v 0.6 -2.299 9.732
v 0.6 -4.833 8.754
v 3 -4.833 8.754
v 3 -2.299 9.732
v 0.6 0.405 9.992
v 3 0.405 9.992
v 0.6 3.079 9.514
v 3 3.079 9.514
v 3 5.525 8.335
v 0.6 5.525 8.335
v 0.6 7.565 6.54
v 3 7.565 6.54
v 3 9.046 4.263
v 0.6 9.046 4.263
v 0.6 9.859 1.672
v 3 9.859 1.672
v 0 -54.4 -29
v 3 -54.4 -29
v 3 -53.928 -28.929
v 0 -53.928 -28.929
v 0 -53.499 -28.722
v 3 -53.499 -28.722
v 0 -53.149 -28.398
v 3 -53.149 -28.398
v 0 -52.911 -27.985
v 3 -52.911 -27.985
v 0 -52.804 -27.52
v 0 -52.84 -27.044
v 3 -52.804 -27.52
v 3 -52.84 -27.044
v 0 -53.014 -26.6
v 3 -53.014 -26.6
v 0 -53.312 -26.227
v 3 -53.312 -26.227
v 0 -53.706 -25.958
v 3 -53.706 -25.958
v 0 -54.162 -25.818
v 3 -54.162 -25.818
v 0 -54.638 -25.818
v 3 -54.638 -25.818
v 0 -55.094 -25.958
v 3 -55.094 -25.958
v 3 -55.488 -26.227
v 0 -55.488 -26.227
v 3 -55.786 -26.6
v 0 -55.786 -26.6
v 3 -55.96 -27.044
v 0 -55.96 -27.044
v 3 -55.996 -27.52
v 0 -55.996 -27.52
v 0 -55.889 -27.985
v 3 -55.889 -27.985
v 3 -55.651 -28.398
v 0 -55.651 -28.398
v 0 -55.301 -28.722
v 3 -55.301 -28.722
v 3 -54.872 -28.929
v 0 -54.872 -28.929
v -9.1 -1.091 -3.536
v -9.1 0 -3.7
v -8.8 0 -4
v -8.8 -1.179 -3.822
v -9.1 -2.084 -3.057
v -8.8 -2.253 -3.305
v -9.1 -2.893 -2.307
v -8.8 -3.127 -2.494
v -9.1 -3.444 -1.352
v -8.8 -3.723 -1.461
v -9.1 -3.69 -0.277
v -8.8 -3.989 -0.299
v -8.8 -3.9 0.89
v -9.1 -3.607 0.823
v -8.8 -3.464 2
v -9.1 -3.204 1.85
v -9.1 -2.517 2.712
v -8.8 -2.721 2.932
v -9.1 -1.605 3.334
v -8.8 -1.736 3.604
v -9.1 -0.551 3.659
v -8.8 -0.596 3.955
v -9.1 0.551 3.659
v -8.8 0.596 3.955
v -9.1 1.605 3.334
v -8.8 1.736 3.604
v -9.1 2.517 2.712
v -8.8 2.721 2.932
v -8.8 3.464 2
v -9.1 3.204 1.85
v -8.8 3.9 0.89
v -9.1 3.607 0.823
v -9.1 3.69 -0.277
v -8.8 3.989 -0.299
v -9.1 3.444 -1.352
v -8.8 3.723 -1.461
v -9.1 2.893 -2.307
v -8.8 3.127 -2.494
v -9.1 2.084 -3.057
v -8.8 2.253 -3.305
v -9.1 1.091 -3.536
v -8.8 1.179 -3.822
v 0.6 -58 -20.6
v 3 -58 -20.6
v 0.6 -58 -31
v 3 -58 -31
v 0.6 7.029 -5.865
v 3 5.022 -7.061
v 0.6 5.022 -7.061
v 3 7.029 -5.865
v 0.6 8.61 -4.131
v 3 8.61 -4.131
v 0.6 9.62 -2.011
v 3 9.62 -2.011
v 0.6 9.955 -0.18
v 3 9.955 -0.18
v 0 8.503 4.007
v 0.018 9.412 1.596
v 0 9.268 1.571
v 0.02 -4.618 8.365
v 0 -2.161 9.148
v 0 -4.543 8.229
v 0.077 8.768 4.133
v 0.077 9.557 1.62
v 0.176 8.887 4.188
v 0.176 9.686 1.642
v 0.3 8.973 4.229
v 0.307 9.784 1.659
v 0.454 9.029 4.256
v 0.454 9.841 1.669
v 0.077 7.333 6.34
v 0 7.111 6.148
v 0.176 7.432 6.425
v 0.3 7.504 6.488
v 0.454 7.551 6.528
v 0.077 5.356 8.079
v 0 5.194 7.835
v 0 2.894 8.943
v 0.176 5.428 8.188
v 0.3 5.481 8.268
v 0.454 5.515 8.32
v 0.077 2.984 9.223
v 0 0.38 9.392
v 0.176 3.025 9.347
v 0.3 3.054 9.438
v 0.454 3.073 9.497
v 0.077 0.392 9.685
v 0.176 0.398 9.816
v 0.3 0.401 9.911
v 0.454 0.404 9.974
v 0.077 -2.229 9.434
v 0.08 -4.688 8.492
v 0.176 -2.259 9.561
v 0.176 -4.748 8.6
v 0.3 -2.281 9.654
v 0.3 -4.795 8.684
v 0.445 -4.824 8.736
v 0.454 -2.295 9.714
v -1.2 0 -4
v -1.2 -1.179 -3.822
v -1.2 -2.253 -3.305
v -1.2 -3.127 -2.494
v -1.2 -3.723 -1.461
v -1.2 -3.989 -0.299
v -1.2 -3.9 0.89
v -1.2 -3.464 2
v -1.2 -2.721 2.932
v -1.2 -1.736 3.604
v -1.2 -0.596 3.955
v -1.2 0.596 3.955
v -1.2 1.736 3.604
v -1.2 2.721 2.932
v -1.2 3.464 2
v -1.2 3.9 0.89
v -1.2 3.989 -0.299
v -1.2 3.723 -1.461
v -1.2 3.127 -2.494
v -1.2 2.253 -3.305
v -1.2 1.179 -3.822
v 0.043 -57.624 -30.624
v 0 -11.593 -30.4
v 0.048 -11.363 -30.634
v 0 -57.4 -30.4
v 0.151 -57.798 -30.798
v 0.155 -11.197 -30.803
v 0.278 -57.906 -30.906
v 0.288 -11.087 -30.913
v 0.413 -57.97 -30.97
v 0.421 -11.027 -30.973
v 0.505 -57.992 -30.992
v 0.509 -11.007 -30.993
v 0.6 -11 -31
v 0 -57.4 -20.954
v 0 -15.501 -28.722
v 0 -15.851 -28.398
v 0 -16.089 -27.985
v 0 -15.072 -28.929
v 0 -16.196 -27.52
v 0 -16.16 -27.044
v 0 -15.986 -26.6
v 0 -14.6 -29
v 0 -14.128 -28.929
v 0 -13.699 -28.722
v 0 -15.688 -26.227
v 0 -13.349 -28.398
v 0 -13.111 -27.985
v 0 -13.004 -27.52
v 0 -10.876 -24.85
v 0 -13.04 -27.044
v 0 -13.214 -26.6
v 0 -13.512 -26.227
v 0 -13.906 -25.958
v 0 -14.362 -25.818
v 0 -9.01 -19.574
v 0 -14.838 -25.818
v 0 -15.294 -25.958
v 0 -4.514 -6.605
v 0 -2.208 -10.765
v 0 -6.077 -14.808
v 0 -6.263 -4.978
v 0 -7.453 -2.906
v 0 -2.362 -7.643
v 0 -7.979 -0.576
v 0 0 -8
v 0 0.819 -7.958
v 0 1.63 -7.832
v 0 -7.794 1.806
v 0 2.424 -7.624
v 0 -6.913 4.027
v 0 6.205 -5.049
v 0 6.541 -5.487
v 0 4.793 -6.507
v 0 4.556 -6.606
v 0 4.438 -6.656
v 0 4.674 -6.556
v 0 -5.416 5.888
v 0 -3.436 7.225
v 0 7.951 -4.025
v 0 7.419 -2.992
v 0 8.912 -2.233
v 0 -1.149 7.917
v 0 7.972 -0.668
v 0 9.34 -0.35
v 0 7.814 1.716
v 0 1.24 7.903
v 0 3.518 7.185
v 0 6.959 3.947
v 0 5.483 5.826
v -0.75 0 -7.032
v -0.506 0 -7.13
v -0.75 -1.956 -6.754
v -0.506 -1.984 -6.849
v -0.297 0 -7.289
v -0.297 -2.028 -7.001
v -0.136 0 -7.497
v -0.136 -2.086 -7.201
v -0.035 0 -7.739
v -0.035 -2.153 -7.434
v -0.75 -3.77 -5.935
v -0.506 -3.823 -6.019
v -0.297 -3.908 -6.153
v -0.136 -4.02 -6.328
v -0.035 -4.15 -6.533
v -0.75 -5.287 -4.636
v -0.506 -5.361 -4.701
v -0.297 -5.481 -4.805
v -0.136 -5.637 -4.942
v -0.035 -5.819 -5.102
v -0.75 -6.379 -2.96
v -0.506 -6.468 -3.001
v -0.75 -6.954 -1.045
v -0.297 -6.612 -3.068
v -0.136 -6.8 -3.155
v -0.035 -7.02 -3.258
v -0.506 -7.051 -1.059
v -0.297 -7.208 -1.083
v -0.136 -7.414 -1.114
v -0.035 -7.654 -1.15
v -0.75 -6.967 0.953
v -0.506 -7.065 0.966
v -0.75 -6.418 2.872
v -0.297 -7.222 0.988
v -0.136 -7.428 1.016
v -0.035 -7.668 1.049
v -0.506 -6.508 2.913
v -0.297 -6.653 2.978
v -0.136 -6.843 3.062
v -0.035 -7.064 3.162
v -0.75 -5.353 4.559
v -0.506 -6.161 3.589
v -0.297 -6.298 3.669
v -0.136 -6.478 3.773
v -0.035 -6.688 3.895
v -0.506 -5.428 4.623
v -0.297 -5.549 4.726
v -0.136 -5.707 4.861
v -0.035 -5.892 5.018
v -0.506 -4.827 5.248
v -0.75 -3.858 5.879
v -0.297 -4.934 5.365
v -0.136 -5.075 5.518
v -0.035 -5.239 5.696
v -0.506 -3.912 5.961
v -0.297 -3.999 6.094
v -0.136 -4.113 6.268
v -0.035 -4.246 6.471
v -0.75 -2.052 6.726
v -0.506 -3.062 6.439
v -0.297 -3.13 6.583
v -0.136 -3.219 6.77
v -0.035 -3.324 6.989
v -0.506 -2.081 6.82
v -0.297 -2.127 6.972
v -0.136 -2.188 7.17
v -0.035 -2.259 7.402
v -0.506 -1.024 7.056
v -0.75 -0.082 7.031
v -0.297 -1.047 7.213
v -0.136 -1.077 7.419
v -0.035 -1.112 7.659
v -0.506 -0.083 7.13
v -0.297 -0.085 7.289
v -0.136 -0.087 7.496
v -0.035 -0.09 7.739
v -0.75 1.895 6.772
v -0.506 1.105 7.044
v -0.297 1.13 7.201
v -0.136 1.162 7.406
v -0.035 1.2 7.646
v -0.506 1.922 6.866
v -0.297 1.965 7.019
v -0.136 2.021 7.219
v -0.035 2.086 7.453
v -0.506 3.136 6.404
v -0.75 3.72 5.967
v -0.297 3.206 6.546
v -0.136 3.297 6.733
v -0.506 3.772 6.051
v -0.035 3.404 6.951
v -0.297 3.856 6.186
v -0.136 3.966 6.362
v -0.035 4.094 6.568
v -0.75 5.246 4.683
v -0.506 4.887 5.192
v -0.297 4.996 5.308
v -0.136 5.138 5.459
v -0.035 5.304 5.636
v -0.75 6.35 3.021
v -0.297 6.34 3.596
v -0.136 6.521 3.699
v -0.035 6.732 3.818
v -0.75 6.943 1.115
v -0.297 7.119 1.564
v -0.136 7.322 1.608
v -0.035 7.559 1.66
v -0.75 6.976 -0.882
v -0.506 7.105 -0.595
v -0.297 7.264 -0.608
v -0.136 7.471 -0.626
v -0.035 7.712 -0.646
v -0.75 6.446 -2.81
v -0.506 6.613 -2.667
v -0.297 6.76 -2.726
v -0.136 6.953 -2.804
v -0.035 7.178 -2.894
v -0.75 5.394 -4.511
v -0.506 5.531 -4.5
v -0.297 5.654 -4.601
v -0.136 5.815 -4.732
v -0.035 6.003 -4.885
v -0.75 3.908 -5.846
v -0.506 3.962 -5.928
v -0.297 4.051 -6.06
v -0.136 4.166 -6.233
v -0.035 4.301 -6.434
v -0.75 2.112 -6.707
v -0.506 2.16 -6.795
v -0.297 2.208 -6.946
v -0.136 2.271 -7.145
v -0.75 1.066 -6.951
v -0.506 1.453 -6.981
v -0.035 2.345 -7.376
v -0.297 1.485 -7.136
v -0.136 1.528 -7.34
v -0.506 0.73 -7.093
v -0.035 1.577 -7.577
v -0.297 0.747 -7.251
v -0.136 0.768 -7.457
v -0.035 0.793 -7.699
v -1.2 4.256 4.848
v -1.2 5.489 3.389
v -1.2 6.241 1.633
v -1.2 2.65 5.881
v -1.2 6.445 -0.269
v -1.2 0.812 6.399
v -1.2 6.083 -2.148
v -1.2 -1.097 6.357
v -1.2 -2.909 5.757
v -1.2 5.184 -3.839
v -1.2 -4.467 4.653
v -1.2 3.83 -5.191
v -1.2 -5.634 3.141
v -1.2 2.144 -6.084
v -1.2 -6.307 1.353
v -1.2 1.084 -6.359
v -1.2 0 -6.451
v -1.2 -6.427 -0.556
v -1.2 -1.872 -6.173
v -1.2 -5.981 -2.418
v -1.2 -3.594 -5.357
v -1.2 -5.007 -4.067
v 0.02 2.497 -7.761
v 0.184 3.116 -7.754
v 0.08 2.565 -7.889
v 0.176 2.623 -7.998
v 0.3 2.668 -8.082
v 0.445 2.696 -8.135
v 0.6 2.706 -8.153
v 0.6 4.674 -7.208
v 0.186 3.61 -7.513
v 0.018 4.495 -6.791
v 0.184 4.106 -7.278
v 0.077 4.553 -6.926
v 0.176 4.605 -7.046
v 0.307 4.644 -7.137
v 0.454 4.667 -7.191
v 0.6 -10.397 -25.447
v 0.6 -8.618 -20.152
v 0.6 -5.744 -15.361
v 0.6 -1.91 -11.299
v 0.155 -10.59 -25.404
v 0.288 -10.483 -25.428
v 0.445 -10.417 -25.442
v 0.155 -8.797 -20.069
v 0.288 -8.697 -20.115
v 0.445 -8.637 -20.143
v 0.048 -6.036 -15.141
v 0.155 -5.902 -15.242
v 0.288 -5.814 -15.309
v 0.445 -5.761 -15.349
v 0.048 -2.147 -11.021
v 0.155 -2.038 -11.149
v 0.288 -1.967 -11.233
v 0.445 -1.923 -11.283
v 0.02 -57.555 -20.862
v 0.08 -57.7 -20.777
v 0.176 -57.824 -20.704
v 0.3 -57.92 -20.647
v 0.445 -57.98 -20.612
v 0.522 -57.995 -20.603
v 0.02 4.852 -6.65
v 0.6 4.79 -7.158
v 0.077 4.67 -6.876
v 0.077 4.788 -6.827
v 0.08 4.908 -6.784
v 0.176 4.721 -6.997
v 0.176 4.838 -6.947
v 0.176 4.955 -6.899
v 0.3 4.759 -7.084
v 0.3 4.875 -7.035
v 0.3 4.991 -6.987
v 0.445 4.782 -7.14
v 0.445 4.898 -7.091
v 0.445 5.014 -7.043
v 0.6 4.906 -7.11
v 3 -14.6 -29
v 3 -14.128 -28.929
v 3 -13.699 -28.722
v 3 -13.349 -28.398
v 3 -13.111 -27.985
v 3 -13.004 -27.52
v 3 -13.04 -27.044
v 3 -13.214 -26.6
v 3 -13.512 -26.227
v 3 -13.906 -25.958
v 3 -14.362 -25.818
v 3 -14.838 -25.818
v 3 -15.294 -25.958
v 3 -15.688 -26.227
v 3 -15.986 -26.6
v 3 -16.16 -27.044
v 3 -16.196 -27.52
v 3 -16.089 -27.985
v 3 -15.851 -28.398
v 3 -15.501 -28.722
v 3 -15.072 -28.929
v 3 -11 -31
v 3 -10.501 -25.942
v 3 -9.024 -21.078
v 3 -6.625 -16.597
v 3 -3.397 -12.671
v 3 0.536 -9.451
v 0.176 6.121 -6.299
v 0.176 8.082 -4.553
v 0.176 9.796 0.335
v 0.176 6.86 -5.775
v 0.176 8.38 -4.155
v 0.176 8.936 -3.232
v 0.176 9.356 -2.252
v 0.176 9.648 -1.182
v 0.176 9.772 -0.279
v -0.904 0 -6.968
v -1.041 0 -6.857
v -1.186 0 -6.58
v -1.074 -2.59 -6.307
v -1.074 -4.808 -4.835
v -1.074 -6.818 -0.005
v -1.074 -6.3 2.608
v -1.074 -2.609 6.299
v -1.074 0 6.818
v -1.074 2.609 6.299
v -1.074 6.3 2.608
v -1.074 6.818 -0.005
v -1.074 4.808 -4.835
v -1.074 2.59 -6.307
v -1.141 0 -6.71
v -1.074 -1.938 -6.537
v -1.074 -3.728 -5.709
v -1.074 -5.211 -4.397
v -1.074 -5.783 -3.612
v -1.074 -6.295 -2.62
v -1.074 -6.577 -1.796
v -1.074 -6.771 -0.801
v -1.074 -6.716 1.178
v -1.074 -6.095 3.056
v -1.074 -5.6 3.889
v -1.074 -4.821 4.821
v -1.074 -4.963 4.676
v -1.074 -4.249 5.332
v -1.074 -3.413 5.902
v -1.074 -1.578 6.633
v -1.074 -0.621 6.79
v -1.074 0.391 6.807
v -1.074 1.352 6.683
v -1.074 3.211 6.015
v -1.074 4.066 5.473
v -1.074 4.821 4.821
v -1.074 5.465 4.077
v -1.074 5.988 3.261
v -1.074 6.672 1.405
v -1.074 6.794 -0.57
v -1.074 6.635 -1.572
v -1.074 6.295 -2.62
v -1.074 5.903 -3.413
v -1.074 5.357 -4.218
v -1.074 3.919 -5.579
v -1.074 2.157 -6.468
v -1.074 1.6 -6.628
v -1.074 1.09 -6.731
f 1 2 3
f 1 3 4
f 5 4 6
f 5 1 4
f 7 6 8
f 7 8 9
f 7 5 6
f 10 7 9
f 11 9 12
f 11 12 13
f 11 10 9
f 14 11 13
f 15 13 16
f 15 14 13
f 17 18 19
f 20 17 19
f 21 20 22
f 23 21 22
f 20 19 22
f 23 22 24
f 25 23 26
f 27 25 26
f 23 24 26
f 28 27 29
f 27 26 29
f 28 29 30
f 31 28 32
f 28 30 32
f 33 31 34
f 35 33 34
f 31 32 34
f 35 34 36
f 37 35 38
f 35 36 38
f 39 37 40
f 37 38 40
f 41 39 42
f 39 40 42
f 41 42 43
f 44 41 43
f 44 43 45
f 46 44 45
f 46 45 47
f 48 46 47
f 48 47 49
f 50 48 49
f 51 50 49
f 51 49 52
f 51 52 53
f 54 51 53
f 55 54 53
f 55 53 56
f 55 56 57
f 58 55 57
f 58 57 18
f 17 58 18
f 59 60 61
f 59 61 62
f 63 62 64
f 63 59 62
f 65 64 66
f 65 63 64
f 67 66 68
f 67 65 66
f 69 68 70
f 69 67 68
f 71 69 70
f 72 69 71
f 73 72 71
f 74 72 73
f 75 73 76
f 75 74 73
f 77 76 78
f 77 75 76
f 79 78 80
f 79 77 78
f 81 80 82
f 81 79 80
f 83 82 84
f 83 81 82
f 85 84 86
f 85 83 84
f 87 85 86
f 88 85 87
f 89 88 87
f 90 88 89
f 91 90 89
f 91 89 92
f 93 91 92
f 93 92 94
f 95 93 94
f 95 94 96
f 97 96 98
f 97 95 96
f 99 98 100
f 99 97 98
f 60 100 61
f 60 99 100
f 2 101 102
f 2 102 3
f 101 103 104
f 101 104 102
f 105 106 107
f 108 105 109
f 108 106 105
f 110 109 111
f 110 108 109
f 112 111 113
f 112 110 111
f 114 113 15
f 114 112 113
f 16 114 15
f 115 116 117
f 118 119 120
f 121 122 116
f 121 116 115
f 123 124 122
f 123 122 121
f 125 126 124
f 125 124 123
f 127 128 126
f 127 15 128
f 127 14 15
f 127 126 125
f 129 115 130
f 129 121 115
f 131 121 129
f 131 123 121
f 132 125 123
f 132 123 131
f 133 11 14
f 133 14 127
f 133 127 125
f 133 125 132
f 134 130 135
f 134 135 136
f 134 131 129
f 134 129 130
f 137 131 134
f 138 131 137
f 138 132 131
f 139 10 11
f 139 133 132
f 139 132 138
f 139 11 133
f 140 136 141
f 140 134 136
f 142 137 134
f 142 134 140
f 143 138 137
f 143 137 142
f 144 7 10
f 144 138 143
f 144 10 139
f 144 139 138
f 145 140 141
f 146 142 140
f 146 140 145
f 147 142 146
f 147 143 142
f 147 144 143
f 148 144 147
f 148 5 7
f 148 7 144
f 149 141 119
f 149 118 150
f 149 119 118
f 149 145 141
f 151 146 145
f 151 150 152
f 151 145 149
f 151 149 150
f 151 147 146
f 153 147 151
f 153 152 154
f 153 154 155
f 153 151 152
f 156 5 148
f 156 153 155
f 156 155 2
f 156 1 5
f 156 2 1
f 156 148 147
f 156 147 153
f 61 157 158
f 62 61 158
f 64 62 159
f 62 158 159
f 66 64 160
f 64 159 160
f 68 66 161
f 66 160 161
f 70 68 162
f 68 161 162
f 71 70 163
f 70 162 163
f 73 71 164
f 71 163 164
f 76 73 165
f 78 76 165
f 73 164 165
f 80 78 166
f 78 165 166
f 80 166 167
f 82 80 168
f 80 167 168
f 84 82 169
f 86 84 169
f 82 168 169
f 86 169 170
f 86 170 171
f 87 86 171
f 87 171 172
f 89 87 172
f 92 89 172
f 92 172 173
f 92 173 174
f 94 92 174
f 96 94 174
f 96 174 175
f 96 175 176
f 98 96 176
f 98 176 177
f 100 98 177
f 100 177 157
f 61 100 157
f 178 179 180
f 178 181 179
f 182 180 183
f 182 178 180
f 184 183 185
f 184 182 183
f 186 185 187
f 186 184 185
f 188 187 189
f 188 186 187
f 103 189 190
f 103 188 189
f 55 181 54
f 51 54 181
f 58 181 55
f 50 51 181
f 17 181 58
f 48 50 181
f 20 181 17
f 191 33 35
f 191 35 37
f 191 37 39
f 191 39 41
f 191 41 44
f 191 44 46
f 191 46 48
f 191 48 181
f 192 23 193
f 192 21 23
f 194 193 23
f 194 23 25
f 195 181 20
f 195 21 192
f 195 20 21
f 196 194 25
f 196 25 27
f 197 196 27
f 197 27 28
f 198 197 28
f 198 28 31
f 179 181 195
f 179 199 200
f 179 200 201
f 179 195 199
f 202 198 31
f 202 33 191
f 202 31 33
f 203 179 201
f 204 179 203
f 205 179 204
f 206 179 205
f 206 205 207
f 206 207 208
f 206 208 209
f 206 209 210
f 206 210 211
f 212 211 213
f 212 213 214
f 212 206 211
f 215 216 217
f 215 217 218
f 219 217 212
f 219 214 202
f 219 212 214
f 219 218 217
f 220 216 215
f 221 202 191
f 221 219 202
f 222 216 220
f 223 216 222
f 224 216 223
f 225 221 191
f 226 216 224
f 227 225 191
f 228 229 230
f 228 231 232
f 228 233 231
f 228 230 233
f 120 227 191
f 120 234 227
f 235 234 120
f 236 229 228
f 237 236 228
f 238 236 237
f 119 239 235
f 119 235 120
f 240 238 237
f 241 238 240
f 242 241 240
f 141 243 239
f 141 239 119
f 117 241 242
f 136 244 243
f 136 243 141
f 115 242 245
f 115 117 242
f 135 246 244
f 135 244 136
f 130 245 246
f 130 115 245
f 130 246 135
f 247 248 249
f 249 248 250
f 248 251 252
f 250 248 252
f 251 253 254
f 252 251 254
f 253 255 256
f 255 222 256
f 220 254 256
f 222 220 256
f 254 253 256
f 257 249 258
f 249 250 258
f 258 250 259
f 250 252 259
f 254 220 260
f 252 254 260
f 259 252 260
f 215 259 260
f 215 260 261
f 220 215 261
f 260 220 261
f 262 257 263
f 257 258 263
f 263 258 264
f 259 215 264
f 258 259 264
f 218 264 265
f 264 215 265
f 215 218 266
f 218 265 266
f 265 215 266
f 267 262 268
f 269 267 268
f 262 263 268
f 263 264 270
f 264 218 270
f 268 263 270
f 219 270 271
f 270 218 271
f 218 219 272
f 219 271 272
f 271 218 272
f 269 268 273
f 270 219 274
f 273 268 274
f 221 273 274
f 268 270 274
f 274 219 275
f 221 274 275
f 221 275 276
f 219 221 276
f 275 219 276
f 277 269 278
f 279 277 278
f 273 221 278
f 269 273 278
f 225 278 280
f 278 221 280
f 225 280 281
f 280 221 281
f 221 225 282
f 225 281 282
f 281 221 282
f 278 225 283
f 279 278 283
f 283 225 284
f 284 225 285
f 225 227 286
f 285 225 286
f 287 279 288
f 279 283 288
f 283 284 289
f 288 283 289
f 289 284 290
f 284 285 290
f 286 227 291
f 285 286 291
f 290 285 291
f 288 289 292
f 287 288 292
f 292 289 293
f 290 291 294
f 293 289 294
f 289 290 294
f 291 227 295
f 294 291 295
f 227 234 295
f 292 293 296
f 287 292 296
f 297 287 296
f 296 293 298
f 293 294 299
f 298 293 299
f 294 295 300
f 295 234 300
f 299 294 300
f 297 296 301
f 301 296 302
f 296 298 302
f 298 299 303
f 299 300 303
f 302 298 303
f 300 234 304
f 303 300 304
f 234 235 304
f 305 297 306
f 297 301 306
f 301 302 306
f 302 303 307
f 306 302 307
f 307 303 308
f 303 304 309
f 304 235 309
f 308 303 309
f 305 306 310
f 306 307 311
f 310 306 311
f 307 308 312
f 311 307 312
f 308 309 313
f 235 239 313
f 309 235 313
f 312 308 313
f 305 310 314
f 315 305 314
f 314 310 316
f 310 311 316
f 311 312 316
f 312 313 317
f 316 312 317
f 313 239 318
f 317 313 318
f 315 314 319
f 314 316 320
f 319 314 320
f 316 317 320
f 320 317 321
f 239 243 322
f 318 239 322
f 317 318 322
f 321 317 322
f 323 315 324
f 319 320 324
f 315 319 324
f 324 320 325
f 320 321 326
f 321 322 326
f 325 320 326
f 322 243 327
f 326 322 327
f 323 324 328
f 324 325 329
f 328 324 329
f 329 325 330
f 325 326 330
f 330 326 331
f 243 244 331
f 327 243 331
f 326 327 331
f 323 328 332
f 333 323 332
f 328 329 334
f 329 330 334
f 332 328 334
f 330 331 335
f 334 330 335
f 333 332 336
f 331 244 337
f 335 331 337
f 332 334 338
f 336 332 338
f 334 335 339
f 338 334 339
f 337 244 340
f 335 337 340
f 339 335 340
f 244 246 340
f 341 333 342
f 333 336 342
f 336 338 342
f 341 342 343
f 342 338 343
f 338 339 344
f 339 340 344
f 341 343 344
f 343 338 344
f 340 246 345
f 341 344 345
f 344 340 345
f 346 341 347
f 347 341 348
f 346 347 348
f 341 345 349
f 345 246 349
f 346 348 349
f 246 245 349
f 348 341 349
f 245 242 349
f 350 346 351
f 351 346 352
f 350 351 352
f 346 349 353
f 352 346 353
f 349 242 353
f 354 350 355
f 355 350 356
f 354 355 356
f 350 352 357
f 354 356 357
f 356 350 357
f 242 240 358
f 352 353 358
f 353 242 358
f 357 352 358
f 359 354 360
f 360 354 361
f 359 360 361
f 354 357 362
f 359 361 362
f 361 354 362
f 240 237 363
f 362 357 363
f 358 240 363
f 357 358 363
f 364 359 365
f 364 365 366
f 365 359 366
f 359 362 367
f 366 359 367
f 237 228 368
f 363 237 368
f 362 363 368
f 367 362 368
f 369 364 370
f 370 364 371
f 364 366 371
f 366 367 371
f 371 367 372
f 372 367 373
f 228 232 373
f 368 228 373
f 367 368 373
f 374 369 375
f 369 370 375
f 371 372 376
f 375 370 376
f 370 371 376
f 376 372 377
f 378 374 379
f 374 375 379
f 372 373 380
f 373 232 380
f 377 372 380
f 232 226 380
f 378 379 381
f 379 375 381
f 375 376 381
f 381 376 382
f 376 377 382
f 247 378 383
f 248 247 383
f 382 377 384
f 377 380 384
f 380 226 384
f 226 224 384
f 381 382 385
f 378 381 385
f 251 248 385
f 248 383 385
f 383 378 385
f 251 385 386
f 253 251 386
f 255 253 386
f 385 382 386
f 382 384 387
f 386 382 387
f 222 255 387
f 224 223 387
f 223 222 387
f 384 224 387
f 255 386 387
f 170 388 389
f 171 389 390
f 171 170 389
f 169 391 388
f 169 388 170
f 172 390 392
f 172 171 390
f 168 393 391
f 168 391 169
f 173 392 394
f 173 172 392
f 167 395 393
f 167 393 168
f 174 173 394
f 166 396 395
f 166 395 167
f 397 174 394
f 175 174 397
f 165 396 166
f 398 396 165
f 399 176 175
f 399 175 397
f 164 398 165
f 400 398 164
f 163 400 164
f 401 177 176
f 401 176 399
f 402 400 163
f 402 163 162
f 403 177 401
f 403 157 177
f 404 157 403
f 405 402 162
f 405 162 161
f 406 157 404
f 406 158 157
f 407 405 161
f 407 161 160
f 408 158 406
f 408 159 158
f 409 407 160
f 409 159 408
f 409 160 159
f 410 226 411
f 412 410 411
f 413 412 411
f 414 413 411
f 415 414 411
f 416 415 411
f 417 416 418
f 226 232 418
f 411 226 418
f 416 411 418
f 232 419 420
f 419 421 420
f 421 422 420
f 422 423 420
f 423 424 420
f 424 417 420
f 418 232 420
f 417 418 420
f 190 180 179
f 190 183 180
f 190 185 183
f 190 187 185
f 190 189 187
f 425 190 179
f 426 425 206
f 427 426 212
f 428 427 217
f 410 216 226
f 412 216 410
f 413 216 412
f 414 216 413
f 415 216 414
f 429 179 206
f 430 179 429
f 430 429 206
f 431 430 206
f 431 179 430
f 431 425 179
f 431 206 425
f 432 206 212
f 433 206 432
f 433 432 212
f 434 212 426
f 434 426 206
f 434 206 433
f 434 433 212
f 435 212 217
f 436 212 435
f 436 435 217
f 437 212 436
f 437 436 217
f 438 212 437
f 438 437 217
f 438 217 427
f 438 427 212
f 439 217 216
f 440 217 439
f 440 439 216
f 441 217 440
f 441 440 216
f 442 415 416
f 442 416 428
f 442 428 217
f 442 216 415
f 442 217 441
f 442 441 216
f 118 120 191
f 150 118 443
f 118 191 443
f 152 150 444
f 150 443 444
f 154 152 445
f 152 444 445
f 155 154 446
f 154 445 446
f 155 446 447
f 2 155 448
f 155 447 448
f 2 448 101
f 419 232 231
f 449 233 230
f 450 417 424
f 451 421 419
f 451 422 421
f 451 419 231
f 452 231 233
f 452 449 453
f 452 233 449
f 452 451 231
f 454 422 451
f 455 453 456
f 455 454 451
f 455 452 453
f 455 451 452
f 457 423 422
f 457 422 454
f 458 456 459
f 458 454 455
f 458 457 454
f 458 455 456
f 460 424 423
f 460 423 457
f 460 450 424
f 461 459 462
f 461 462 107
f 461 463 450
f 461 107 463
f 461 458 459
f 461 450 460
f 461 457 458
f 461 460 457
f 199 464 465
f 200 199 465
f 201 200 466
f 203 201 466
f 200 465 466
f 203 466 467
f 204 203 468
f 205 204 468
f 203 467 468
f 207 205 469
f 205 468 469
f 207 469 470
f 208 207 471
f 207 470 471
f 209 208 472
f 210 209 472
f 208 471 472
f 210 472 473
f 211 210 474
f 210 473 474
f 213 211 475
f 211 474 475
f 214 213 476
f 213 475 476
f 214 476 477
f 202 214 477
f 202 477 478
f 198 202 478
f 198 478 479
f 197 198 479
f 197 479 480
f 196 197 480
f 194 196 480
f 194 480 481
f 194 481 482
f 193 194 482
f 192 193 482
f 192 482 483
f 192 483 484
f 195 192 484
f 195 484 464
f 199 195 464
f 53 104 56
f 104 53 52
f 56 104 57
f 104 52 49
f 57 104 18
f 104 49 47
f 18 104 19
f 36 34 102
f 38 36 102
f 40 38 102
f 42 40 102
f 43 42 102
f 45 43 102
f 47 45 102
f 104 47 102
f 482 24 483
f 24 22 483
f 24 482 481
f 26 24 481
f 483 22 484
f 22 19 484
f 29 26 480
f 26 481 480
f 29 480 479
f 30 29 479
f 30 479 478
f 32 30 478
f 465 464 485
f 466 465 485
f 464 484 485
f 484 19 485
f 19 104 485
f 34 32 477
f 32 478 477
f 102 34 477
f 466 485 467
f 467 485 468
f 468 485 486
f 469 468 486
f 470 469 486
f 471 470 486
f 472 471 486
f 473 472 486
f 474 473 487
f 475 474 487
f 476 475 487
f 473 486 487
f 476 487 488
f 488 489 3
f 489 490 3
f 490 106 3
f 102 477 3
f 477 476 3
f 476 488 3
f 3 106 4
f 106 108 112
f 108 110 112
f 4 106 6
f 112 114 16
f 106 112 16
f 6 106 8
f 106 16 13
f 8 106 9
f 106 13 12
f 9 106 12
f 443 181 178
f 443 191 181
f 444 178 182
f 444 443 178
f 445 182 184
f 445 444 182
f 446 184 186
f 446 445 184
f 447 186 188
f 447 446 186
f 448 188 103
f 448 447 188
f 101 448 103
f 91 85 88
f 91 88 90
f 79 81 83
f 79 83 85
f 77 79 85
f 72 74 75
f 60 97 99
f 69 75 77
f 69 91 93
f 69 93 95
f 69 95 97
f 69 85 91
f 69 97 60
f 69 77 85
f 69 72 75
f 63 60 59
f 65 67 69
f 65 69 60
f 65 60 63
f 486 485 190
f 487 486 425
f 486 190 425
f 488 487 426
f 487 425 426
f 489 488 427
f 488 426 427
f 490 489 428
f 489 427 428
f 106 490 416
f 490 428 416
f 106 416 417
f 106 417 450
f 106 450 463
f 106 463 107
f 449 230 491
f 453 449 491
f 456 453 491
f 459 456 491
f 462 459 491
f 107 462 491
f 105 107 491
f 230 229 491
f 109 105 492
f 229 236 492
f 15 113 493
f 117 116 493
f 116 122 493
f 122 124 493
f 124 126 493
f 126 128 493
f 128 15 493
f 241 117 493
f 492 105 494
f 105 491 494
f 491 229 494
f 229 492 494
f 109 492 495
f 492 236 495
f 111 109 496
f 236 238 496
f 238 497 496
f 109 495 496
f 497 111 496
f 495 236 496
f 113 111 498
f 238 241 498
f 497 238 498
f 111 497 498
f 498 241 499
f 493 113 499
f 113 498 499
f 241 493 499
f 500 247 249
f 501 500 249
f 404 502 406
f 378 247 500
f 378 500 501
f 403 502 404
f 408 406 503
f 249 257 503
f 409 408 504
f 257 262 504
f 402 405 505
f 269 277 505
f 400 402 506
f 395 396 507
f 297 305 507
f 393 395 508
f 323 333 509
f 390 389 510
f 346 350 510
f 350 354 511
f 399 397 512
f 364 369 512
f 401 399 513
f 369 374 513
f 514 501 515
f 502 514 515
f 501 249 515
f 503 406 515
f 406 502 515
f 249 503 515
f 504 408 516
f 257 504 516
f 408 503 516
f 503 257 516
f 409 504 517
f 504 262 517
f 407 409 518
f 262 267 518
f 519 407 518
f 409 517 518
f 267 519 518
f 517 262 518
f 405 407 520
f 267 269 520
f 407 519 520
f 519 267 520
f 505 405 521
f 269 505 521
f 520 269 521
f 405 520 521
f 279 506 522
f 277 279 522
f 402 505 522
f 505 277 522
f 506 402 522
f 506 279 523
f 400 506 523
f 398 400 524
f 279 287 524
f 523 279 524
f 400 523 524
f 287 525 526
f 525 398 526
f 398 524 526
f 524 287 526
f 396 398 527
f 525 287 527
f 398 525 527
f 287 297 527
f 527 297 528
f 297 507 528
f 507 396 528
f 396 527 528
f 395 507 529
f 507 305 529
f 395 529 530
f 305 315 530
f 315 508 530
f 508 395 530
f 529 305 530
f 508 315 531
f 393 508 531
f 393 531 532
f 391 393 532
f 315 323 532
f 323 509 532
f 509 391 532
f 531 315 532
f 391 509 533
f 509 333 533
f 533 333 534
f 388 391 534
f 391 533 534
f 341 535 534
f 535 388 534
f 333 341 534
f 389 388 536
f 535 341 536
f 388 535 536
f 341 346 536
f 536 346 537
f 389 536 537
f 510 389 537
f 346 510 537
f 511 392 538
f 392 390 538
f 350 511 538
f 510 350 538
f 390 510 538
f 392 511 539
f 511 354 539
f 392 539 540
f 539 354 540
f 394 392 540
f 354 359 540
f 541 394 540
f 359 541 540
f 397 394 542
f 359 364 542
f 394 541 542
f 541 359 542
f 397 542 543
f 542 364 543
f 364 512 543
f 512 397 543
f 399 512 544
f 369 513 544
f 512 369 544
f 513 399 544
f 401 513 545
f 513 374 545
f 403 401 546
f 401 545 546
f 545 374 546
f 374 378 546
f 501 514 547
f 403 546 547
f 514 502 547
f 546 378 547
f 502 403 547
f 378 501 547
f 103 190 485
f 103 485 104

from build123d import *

# Parameters (mm, degrees)
AUFSATZ_LINEAR_AUSTRAGEN1_DEPTH = 3
SKIZZE2_R                       = 4
AUFSATZ_LINEAR_AUSTRAGEN2_DEPTH = 9.1
FASE1_SIZE                      = 0.3
SKIZZE3_R                       = 1.6
SCHNITT_LINEAR_AUSTRAGEN1_DEPTH = 6
SKIZZE4_R                       = 7
AUFSATZ_LINEAR_AUSTRAGEN3_DEPTH = 1.2
VERRUNDUNG1_R                   = 1
SCHNITT_LINEAR_AUSTRAGEN2_DEPTH = 10
VERRUNDUNG3_R                   = 8
VERRUNDUNG4_R                   = 0.6
VERRUNDUNG5_R                   = 0.6


with BuildPart() as part:
    # Skizze1 → Aufsatz-Linear austragen1 (new body)
    with BuildSketch(Plane(origin=(0, 0, 0), x_dir=(0, 0, -1), z_dir=(1, 0, 0))):
        with BuildLine():
            Line((31, -11), (31, -58))
            Line((31, -58), (20.6, -58))
            Line((20.6, -58), (-8.754311744, -4.833427964))
            ThreePointArc((-8.754311744, -4.833427964), (-6.538746444, 7.566029007), (6.05088421, 7.961582774))
            Line((6.05088421, 7.961582774), (31, -11))
        make_face()
    extrude(amount=AUFSATZ_LINEAR_AUSTRAGEN1_DEPTH)

    # Skizze2 → Aufsatz-Linear austragen2 (add)
    with BuildSketch(Plane.ZY):
        with Locations(Location((0, 0, 0), (0, 0, 180))):
            Circle(SKIZZE2_R)
    extrude(amount=AUFSATZ_LINEAR_AUSTRAGEN2_DEPTH)

    # Fase1
    fase1_edges = [part.edges().sort_by_distance(p)[0] for p in [
        (-9.1, 0, 4),
    ]]
    chamfer(fase1_edges, length=FASE1_SIZE)

    # Skizze3 → Schnitt-Linear austragen1 (cut)
    with BuildSketch(Plane(origin=(3, 0, 0), x_dir=(0, 0, -1), z_dir=(1, 0, 0))):
        with Locations((27.4, -54.4)):
            Circle(SKIZZE3_R)
        with Locations((27.4, -14.6)):
            Circle(SKIZZE3_R)
    extrude(amount=-SCHNITT_LINEAR_AUSTRAGEN1_DEPTH, mode=Mode.SUBTRACT)

    # Skizze4 → Aufsatz-Linear austragen3 (add)
    with BuildSketch(Plane.ZY):
        with Locations(Location((0, 0, 0), (0, 0, 180))):
            Circle(SKIZZE4_R)
    extrude(amount=AUFSATZ_LINEAR_AUSTRAGEN3_DEPTH)

    # Verrundung1
    verrundung1_edges = [part.edges().sort_by_distance(p)[0] for p in [
        (0, 0, 7),
    ]]
    fillet(verrundung1_edges, radius=VERRUNDUNG1_R)

    # Skizze5 → Schnitt-Linear austragen2 (cut)
    with BuildSketch(Plane.ZY):
        with BuildLine():
            ThreePointArc((-31, -11), (-15.331560384, -5.721628096), (-6.05088421, 7.961582774))
            Line((-6.05088421, 7.961582774), (-31, -11))
        make_face()
    extrude(amount=-SCHNITT_LINEAR_AUSTRAGEN2_DEPTH, mode=Mode.SUBTRACT)

    # Verrundung3
    verrundung3_edges = [part.edges().sort_by_distance(p)[0] for p in [
        (1.5, 7.961582774, -6.05088421),
    ]]
    fillet(verrundung3_edges, radius=VERRUNDUNG3_R)

    # Verrundung4
    verrundung4_edges = [part.edges().sort_by_distance(p)[0] for p in [
        (0, -6.624911651, -16.597231966),
        (0, -34.5, -31),
        (0, 4.342309459, 9.008015795),
        (0, 8.970000491, -3.541995713),
        (0, -58, -25.8),
        (0, -31.416713982, -5.922844128),
    ]]
    fillet(verrundung4_edges, radius=VERRUNDUNG4_R)

    # Verrundung5
    verrundung5_edges = [part.edges().sort_by_distance(p)[0] for p in [
        (-1.2, 0, 7),
    ]]
    fillet(verrundung5_edges, radius=VERRUNDUNG5_R)


solid = part.part
